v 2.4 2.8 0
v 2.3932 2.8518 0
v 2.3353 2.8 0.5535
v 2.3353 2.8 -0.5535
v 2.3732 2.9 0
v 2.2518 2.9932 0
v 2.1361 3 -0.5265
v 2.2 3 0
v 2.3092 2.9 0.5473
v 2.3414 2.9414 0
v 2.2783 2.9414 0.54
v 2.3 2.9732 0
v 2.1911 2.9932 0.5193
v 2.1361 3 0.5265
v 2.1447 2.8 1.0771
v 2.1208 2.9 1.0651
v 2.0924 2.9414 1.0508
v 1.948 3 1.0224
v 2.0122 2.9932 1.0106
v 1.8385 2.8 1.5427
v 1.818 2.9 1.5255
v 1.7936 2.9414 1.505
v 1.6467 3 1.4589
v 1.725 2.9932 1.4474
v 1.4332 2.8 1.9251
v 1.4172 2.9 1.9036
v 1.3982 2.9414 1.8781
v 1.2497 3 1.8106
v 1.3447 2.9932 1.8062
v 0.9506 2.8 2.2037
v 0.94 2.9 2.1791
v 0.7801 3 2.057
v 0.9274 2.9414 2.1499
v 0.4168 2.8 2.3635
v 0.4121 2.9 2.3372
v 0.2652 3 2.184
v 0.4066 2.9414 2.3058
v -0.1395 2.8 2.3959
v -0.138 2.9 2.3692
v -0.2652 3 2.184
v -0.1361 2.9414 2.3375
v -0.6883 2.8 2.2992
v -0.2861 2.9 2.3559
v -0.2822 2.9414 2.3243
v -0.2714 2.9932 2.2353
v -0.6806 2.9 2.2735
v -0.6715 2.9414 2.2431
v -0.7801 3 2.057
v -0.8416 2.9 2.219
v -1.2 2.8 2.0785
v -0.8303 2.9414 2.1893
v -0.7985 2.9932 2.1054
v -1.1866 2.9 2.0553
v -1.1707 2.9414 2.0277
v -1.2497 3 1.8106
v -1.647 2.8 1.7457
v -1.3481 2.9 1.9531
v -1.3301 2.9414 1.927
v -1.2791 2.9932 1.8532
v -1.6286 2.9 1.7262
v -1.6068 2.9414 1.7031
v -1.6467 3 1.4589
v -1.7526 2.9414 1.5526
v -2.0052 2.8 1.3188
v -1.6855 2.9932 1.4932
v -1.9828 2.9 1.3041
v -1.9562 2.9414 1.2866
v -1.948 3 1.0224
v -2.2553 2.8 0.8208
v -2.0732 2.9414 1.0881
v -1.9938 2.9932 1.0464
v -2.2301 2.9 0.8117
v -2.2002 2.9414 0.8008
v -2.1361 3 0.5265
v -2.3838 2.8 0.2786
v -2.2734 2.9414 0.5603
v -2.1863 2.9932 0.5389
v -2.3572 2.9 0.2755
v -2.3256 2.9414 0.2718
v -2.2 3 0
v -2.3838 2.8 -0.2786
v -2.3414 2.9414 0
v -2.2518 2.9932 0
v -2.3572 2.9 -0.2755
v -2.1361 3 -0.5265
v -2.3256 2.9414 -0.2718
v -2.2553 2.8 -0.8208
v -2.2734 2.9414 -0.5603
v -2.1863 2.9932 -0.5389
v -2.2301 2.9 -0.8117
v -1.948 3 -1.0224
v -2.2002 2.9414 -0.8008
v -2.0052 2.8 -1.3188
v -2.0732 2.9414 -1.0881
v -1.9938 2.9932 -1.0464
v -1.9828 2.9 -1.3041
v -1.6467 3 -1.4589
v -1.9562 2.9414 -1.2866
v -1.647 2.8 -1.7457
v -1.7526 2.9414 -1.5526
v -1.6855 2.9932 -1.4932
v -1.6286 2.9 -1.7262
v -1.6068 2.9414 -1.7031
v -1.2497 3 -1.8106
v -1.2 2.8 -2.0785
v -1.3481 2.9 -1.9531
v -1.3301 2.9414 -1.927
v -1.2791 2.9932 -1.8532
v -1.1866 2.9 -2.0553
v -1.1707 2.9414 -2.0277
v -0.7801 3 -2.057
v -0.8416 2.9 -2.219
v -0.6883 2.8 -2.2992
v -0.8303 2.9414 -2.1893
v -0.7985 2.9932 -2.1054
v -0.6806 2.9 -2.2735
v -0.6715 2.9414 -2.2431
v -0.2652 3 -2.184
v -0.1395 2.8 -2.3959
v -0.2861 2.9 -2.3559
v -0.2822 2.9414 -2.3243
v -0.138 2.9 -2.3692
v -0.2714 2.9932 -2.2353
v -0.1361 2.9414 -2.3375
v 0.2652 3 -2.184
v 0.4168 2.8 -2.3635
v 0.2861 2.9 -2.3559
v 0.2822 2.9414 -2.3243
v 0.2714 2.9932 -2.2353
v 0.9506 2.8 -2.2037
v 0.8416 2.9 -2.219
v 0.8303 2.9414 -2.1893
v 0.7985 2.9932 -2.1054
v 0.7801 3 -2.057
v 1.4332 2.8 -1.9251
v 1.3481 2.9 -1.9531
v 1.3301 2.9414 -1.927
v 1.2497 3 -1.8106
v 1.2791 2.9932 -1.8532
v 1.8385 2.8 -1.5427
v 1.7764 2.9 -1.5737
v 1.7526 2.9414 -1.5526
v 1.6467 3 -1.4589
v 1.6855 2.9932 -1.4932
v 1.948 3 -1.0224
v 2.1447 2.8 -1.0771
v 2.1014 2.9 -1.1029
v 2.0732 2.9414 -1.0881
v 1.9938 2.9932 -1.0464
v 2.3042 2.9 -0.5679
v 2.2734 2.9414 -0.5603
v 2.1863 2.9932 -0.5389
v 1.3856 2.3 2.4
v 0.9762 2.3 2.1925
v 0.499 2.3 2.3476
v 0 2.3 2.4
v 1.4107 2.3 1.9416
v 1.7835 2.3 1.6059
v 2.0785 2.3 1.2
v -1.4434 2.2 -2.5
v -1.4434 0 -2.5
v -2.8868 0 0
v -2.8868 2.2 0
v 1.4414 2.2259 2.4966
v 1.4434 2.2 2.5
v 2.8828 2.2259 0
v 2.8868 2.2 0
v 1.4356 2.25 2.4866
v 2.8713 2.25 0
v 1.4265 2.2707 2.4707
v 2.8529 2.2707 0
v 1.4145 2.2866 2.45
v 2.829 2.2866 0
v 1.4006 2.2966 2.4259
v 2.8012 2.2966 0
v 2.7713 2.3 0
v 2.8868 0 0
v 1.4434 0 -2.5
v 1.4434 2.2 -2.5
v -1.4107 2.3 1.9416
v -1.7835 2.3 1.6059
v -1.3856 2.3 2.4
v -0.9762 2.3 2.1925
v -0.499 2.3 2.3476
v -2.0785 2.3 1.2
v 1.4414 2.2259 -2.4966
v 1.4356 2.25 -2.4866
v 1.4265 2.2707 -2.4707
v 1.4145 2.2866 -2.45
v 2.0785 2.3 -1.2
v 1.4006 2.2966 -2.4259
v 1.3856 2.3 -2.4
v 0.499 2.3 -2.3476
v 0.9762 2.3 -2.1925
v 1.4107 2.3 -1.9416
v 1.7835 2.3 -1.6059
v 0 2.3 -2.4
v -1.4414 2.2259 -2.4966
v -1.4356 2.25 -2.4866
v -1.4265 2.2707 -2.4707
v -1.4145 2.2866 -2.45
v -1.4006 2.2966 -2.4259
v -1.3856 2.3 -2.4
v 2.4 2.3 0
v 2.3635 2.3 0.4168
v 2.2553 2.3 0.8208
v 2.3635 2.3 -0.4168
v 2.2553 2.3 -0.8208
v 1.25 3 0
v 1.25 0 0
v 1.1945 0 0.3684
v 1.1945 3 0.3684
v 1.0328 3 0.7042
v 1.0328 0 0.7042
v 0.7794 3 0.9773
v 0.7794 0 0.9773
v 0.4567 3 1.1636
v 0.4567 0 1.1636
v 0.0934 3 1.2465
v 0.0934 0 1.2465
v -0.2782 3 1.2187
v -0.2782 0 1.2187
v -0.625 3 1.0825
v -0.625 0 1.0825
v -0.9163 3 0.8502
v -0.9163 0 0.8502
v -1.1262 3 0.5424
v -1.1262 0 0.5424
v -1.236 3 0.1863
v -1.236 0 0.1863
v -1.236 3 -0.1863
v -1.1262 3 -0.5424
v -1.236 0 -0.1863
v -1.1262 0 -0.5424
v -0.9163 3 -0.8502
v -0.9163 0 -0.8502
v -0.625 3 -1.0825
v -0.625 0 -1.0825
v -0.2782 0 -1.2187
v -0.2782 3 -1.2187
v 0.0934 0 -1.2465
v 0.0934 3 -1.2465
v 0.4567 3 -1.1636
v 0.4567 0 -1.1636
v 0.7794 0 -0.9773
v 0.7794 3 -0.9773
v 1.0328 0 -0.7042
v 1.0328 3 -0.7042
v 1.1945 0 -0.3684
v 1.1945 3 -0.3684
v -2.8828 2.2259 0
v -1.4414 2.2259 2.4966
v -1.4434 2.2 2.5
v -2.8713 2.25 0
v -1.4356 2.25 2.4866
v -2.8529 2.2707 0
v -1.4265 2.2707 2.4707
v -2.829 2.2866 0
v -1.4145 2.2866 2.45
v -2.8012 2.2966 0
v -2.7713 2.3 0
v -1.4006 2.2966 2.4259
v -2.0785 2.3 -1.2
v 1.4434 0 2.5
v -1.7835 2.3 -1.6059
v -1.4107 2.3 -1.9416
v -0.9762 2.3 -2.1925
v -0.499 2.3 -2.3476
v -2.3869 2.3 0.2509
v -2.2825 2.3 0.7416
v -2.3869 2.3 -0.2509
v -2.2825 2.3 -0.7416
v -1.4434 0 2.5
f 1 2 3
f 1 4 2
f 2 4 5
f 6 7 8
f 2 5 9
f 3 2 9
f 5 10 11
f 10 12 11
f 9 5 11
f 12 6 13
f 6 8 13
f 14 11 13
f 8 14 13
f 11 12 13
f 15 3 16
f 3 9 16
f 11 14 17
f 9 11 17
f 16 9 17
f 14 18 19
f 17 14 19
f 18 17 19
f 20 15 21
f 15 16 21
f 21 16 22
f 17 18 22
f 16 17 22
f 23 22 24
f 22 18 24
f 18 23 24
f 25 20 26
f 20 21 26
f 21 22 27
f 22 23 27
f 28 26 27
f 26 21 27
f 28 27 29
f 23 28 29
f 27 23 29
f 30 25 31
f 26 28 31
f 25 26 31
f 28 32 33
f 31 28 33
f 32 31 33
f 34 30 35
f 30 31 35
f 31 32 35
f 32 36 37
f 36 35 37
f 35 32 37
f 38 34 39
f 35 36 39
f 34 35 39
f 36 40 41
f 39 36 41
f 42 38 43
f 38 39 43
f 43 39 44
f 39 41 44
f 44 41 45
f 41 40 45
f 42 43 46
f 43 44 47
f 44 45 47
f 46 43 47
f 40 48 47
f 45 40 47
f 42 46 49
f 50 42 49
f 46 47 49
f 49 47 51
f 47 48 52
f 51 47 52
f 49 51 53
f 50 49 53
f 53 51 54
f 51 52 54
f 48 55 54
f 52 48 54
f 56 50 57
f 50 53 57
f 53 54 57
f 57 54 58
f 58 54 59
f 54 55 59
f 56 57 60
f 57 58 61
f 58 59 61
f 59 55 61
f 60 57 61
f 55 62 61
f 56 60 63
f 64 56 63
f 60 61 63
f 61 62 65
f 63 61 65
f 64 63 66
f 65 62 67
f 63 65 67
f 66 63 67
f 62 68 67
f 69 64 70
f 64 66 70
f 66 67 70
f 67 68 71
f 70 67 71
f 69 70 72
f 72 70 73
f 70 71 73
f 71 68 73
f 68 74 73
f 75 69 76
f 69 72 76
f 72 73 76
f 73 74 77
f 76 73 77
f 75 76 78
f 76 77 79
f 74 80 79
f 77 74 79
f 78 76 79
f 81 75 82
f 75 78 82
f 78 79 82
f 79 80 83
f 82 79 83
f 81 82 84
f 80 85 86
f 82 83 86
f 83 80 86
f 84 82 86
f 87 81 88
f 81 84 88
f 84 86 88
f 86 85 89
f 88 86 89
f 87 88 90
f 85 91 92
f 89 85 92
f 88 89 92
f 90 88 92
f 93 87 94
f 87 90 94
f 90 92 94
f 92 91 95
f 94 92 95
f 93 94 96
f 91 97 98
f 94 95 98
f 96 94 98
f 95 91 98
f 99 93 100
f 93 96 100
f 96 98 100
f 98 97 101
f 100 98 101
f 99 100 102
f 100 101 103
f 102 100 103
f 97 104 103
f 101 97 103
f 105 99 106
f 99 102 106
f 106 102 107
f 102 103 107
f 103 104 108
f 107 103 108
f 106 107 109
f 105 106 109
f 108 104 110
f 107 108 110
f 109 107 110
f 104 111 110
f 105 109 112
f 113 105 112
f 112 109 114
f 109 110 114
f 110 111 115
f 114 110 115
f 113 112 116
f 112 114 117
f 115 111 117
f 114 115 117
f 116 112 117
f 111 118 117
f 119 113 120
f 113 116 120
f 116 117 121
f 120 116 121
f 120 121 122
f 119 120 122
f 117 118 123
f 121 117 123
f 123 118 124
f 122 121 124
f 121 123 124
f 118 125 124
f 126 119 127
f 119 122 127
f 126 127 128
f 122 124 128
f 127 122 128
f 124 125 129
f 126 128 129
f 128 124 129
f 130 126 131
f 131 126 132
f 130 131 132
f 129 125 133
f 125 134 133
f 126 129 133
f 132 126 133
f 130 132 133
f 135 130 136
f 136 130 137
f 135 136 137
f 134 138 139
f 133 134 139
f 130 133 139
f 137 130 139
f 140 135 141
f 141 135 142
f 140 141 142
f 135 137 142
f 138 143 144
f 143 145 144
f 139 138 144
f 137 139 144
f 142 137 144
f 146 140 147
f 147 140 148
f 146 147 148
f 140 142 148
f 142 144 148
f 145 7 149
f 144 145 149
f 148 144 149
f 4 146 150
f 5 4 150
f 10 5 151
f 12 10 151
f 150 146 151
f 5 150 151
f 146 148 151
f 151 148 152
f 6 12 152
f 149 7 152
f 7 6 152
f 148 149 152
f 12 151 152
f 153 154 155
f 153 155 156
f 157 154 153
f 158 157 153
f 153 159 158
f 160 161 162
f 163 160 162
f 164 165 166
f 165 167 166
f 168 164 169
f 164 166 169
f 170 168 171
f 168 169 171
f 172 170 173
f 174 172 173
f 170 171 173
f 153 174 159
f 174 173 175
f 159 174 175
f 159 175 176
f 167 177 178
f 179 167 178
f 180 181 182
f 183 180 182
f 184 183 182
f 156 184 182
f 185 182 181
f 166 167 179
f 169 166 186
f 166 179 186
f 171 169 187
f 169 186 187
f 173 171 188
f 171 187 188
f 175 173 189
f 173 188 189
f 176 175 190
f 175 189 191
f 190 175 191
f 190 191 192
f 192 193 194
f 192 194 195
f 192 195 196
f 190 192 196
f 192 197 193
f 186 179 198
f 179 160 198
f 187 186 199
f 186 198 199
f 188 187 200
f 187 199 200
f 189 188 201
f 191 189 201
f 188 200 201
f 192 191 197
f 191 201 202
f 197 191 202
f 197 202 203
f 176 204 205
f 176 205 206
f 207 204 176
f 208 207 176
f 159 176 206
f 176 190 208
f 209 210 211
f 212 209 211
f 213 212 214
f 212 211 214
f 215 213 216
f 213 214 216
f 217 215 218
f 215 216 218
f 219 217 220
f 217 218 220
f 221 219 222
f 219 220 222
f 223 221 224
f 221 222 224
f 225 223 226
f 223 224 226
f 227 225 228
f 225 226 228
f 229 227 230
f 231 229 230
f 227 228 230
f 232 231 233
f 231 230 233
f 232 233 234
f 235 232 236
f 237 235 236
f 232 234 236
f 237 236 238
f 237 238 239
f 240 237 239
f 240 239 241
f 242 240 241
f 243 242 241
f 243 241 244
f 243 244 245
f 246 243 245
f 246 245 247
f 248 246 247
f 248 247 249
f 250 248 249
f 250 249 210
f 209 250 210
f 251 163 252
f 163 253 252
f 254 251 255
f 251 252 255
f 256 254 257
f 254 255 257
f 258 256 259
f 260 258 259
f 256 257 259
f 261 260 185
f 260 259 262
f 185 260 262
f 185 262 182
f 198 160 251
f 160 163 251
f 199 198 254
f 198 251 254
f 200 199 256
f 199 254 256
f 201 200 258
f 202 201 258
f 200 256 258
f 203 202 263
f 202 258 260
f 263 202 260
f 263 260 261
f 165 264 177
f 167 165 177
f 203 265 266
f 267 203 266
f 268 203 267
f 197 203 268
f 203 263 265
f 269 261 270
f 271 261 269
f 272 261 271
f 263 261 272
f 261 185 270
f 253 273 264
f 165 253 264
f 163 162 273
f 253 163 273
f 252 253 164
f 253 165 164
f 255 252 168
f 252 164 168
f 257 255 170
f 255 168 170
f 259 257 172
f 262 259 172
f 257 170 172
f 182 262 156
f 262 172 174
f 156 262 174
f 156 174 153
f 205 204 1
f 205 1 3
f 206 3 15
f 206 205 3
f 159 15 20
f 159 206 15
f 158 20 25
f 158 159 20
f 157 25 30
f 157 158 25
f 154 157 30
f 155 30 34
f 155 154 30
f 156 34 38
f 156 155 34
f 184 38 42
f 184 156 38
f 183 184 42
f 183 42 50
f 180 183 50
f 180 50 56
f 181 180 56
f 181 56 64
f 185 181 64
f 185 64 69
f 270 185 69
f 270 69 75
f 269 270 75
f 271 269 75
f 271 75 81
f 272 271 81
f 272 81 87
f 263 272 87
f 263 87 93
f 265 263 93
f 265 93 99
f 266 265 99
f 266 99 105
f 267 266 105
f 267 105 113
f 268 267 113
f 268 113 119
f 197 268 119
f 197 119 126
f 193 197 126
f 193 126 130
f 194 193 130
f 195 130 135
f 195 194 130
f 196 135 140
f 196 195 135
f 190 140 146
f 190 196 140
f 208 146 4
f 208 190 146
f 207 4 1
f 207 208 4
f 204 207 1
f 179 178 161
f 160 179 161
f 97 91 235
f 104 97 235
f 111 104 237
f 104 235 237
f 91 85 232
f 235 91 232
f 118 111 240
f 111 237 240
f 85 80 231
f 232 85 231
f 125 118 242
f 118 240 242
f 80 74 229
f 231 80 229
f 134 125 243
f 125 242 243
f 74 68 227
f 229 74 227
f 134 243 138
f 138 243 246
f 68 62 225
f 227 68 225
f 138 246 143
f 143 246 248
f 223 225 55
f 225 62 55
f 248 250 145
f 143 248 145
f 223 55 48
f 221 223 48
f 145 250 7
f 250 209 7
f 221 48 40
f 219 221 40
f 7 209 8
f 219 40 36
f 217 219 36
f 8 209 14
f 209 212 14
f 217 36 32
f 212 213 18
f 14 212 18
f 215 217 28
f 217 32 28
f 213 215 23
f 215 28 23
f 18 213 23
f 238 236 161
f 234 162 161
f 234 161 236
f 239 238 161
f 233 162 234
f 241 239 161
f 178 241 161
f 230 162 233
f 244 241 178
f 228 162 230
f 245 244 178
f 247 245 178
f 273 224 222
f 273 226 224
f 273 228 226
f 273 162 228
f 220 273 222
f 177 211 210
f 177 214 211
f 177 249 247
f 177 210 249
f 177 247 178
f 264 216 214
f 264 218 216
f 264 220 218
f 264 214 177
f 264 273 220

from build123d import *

# Parameters (mm, degrees)
EXTRUDE_1_DEPTH     = 2.3
FILLET_1_R          = 0.1
SKETCH_2_R          = 2.4
EXTRUDE_2_DEPTH     = 3
FILLET_2_R          = 0.2
SKETCH_3_R          = 1.25
CUT_EXTRUDE_1_DEPTH = 12.8


with BuildPart() as part:
    # 草图1 → 凸台-拉伸1 (new body)
    with BuildSketch(Plane(origin=(0, 0, 0), x_dir=(1, 0, 0), z_dir=(0, 1, 0))):
        Polygon((1.443375673, -2.5), (2.886751346, 0), (1.443375673, 2.5), (-1.443375673, 2.5), (-2.886751346, 0), (-1.443375673, -2.5), align=None)
    extrude(amount=EXTRUDE_1_DEPTH)

    # 圆角1
    fillet_1_edges = [part.edges().sort_by_distance(p)[0] for p in [
        (2.165063509, 2.3, -1.25),
        (0, 2.3, -2.5),
        (-2.165063509, 2.3, -1.25),
        (-2.165063509, 2.3, 1.25),
        (0, 2.3, 2.5),
        (2.165063509, 2.3, 1.25),
    ]]
    fillet(fillet_1_edges, radius=FILLET_1_R)

    # 草图2 → 凸台-拉伸2 (add)
    with BuildSketch(Plane.XZ):
        Circle(SKETCH_2_R)
    extrude(amount=-EXTRUDE_2_DEPTH)

    # 圆角2
    fillet_2_edges = [part.edges().sort_by_distance(p)[0] for p in [
        (-2.4, 3, 0),
    ]]
    fillet(fillet_2_edges, radius=FILLET_2_R)

    # 草图3 → 切除-拉伸1 (cut)
    with BuildSketch(Plane.XZ):
        Circle(SKETCH_3_R)
    extrude(amount=-CUT_EXTRUDE_1_DEPTH, mode=Mode.SUBTRACT)


solid = part.part
